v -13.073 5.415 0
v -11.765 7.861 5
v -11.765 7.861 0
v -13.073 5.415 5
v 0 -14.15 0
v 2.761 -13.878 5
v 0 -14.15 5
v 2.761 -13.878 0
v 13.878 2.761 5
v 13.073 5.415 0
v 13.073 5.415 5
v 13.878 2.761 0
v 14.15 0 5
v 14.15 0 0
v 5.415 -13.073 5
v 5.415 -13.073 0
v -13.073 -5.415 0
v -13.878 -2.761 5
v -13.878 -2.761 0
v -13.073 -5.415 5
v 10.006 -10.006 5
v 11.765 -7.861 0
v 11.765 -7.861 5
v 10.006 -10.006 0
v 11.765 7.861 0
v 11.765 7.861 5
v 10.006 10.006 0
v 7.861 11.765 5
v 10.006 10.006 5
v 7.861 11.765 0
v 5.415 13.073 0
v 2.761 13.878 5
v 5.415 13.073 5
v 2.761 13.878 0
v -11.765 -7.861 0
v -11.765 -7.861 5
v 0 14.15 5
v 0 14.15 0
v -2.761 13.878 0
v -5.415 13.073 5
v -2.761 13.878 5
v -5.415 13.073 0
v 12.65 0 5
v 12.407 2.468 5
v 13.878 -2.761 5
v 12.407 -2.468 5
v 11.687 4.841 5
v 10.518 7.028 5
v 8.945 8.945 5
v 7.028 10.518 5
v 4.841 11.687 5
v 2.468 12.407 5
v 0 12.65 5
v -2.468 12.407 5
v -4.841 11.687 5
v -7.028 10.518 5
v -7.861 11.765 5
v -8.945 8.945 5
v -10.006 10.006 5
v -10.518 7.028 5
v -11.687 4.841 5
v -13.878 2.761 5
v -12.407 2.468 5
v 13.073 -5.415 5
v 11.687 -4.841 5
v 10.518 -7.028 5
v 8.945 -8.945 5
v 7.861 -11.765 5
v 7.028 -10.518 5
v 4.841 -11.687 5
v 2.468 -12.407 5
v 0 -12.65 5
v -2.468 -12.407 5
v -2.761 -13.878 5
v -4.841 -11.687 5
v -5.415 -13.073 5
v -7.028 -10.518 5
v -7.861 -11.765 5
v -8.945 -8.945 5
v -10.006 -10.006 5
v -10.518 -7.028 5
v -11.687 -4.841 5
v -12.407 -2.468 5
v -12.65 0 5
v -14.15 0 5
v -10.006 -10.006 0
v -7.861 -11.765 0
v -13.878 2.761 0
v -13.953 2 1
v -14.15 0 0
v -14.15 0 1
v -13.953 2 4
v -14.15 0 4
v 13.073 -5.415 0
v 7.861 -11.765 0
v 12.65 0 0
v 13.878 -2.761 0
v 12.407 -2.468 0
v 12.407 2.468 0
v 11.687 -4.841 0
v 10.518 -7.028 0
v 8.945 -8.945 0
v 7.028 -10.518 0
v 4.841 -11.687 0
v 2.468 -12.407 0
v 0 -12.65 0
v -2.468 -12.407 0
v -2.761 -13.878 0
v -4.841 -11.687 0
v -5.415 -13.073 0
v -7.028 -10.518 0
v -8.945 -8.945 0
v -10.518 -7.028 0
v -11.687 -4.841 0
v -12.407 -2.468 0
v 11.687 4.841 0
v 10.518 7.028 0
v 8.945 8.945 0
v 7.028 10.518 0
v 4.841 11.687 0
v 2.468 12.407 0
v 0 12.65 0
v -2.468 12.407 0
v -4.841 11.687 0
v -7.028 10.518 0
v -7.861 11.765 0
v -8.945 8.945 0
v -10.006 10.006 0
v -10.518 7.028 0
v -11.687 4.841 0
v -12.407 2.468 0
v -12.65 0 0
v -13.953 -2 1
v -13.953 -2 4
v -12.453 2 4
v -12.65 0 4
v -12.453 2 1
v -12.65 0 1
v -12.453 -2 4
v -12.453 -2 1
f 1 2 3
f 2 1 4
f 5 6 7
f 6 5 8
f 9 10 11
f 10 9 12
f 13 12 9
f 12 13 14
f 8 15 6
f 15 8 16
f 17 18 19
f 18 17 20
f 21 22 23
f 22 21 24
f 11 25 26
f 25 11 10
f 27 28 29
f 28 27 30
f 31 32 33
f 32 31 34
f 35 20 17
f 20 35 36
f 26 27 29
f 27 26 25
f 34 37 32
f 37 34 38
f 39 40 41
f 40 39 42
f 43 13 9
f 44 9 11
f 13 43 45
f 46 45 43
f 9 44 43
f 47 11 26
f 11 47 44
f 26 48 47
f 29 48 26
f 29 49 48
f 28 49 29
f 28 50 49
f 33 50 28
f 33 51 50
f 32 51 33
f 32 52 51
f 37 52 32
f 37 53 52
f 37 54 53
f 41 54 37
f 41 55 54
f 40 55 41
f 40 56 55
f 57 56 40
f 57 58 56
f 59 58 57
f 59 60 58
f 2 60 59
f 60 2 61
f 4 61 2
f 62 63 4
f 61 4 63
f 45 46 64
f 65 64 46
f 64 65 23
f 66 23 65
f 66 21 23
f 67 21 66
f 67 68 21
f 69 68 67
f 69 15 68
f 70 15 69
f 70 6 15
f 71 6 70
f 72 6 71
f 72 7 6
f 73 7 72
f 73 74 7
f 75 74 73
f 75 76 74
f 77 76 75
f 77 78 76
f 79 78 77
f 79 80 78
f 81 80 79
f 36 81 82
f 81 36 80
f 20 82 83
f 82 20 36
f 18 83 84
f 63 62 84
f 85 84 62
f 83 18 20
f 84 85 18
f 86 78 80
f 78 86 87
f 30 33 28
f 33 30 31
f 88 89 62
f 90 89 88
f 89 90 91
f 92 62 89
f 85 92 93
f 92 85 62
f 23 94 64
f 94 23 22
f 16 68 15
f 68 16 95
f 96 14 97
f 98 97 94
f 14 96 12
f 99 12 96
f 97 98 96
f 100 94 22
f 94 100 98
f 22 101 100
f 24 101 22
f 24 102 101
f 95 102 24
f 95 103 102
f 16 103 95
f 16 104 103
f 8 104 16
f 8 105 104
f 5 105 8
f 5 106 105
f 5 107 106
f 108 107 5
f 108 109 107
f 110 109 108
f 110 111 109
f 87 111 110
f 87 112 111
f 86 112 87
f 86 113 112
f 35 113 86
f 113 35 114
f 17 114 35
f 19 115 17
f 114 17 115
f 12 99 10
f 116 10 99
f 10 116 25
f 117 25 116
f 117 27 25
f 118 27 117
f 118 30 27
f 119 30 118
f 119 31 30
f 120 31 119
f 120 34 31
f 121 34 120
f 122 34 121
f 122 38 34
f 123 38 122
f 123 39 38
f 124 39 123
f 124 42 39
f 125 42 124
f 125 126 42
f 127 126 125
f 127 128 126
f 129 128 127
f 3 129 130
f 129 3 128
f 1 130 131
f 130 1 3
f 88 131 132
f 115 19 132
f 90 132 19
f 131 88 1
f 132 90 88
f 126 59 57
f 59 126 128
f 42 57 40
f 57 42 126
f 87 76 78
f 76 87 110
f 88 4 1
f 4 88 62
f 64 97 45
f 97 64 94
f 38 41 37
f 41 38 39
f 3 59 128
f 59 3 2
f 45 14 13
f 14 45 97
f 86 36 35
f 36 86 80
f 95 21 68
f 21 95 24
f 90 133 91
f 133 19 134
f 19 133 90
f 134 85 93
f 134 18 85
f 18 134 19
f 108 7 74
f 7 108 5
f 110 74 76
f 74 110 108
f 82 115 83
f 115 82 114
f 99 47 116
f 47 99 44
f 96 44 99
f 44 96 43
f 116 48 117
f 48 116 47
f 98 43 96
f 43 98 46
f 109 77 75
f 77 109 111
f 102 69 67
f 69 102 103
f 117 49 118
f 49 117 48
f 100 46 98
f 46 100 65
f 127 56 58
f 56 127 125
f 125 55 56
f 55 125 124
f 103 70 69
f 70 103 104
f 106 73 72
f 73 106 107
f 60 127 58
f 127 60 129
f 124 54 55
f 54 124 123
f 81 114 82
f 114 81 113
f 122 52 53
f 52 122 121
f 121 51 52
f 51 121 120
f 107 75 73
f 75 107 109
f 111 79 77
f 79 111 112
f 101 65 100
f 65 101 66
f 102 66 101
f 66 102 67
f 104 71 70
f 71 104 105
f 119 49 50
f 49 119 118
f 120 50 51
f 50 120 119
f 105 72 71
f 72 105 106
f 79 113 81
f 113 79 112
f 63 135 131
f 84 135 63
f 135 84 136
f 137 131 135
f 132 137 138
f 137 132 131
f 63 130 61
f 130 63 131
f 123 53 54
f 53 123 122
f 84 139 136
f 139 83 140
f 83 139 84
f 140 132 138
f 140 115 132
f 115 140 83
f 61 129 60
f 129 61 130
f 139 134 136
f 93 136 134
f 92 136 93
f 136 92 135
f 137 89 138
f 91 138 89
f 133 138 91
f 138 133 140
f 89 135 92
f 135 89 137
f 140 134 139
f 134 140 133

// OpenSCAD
$fn = 32;

// ----------------------------------------------------------------------
// Spacer sleeve: 28.3 / 25.3 x 5 mm
// ----------------------------------------------------------------------

// --- parameters (mm) ---
outer_d = 28.3;           // outside diameter
inner_d = 25.3;           // shaft bore
length = 5;               // sleeve length
slot_w = 4;               // clamp slot width
slot_len = 3;             // clamp slot length

module sleeve() {
  cylinder(h = length, d = outer_d);
}

difference() {
  sleeve();
  translate([0, 0, -1]) cylinder(h = length + 2, d = inner_d);
  translate([-outer_d / 2 - 1, -slot_w / 2, length / 2 - slot_len / 2]) cube([outer_d / 2 + 1, slot_w, slot_len]);
}
